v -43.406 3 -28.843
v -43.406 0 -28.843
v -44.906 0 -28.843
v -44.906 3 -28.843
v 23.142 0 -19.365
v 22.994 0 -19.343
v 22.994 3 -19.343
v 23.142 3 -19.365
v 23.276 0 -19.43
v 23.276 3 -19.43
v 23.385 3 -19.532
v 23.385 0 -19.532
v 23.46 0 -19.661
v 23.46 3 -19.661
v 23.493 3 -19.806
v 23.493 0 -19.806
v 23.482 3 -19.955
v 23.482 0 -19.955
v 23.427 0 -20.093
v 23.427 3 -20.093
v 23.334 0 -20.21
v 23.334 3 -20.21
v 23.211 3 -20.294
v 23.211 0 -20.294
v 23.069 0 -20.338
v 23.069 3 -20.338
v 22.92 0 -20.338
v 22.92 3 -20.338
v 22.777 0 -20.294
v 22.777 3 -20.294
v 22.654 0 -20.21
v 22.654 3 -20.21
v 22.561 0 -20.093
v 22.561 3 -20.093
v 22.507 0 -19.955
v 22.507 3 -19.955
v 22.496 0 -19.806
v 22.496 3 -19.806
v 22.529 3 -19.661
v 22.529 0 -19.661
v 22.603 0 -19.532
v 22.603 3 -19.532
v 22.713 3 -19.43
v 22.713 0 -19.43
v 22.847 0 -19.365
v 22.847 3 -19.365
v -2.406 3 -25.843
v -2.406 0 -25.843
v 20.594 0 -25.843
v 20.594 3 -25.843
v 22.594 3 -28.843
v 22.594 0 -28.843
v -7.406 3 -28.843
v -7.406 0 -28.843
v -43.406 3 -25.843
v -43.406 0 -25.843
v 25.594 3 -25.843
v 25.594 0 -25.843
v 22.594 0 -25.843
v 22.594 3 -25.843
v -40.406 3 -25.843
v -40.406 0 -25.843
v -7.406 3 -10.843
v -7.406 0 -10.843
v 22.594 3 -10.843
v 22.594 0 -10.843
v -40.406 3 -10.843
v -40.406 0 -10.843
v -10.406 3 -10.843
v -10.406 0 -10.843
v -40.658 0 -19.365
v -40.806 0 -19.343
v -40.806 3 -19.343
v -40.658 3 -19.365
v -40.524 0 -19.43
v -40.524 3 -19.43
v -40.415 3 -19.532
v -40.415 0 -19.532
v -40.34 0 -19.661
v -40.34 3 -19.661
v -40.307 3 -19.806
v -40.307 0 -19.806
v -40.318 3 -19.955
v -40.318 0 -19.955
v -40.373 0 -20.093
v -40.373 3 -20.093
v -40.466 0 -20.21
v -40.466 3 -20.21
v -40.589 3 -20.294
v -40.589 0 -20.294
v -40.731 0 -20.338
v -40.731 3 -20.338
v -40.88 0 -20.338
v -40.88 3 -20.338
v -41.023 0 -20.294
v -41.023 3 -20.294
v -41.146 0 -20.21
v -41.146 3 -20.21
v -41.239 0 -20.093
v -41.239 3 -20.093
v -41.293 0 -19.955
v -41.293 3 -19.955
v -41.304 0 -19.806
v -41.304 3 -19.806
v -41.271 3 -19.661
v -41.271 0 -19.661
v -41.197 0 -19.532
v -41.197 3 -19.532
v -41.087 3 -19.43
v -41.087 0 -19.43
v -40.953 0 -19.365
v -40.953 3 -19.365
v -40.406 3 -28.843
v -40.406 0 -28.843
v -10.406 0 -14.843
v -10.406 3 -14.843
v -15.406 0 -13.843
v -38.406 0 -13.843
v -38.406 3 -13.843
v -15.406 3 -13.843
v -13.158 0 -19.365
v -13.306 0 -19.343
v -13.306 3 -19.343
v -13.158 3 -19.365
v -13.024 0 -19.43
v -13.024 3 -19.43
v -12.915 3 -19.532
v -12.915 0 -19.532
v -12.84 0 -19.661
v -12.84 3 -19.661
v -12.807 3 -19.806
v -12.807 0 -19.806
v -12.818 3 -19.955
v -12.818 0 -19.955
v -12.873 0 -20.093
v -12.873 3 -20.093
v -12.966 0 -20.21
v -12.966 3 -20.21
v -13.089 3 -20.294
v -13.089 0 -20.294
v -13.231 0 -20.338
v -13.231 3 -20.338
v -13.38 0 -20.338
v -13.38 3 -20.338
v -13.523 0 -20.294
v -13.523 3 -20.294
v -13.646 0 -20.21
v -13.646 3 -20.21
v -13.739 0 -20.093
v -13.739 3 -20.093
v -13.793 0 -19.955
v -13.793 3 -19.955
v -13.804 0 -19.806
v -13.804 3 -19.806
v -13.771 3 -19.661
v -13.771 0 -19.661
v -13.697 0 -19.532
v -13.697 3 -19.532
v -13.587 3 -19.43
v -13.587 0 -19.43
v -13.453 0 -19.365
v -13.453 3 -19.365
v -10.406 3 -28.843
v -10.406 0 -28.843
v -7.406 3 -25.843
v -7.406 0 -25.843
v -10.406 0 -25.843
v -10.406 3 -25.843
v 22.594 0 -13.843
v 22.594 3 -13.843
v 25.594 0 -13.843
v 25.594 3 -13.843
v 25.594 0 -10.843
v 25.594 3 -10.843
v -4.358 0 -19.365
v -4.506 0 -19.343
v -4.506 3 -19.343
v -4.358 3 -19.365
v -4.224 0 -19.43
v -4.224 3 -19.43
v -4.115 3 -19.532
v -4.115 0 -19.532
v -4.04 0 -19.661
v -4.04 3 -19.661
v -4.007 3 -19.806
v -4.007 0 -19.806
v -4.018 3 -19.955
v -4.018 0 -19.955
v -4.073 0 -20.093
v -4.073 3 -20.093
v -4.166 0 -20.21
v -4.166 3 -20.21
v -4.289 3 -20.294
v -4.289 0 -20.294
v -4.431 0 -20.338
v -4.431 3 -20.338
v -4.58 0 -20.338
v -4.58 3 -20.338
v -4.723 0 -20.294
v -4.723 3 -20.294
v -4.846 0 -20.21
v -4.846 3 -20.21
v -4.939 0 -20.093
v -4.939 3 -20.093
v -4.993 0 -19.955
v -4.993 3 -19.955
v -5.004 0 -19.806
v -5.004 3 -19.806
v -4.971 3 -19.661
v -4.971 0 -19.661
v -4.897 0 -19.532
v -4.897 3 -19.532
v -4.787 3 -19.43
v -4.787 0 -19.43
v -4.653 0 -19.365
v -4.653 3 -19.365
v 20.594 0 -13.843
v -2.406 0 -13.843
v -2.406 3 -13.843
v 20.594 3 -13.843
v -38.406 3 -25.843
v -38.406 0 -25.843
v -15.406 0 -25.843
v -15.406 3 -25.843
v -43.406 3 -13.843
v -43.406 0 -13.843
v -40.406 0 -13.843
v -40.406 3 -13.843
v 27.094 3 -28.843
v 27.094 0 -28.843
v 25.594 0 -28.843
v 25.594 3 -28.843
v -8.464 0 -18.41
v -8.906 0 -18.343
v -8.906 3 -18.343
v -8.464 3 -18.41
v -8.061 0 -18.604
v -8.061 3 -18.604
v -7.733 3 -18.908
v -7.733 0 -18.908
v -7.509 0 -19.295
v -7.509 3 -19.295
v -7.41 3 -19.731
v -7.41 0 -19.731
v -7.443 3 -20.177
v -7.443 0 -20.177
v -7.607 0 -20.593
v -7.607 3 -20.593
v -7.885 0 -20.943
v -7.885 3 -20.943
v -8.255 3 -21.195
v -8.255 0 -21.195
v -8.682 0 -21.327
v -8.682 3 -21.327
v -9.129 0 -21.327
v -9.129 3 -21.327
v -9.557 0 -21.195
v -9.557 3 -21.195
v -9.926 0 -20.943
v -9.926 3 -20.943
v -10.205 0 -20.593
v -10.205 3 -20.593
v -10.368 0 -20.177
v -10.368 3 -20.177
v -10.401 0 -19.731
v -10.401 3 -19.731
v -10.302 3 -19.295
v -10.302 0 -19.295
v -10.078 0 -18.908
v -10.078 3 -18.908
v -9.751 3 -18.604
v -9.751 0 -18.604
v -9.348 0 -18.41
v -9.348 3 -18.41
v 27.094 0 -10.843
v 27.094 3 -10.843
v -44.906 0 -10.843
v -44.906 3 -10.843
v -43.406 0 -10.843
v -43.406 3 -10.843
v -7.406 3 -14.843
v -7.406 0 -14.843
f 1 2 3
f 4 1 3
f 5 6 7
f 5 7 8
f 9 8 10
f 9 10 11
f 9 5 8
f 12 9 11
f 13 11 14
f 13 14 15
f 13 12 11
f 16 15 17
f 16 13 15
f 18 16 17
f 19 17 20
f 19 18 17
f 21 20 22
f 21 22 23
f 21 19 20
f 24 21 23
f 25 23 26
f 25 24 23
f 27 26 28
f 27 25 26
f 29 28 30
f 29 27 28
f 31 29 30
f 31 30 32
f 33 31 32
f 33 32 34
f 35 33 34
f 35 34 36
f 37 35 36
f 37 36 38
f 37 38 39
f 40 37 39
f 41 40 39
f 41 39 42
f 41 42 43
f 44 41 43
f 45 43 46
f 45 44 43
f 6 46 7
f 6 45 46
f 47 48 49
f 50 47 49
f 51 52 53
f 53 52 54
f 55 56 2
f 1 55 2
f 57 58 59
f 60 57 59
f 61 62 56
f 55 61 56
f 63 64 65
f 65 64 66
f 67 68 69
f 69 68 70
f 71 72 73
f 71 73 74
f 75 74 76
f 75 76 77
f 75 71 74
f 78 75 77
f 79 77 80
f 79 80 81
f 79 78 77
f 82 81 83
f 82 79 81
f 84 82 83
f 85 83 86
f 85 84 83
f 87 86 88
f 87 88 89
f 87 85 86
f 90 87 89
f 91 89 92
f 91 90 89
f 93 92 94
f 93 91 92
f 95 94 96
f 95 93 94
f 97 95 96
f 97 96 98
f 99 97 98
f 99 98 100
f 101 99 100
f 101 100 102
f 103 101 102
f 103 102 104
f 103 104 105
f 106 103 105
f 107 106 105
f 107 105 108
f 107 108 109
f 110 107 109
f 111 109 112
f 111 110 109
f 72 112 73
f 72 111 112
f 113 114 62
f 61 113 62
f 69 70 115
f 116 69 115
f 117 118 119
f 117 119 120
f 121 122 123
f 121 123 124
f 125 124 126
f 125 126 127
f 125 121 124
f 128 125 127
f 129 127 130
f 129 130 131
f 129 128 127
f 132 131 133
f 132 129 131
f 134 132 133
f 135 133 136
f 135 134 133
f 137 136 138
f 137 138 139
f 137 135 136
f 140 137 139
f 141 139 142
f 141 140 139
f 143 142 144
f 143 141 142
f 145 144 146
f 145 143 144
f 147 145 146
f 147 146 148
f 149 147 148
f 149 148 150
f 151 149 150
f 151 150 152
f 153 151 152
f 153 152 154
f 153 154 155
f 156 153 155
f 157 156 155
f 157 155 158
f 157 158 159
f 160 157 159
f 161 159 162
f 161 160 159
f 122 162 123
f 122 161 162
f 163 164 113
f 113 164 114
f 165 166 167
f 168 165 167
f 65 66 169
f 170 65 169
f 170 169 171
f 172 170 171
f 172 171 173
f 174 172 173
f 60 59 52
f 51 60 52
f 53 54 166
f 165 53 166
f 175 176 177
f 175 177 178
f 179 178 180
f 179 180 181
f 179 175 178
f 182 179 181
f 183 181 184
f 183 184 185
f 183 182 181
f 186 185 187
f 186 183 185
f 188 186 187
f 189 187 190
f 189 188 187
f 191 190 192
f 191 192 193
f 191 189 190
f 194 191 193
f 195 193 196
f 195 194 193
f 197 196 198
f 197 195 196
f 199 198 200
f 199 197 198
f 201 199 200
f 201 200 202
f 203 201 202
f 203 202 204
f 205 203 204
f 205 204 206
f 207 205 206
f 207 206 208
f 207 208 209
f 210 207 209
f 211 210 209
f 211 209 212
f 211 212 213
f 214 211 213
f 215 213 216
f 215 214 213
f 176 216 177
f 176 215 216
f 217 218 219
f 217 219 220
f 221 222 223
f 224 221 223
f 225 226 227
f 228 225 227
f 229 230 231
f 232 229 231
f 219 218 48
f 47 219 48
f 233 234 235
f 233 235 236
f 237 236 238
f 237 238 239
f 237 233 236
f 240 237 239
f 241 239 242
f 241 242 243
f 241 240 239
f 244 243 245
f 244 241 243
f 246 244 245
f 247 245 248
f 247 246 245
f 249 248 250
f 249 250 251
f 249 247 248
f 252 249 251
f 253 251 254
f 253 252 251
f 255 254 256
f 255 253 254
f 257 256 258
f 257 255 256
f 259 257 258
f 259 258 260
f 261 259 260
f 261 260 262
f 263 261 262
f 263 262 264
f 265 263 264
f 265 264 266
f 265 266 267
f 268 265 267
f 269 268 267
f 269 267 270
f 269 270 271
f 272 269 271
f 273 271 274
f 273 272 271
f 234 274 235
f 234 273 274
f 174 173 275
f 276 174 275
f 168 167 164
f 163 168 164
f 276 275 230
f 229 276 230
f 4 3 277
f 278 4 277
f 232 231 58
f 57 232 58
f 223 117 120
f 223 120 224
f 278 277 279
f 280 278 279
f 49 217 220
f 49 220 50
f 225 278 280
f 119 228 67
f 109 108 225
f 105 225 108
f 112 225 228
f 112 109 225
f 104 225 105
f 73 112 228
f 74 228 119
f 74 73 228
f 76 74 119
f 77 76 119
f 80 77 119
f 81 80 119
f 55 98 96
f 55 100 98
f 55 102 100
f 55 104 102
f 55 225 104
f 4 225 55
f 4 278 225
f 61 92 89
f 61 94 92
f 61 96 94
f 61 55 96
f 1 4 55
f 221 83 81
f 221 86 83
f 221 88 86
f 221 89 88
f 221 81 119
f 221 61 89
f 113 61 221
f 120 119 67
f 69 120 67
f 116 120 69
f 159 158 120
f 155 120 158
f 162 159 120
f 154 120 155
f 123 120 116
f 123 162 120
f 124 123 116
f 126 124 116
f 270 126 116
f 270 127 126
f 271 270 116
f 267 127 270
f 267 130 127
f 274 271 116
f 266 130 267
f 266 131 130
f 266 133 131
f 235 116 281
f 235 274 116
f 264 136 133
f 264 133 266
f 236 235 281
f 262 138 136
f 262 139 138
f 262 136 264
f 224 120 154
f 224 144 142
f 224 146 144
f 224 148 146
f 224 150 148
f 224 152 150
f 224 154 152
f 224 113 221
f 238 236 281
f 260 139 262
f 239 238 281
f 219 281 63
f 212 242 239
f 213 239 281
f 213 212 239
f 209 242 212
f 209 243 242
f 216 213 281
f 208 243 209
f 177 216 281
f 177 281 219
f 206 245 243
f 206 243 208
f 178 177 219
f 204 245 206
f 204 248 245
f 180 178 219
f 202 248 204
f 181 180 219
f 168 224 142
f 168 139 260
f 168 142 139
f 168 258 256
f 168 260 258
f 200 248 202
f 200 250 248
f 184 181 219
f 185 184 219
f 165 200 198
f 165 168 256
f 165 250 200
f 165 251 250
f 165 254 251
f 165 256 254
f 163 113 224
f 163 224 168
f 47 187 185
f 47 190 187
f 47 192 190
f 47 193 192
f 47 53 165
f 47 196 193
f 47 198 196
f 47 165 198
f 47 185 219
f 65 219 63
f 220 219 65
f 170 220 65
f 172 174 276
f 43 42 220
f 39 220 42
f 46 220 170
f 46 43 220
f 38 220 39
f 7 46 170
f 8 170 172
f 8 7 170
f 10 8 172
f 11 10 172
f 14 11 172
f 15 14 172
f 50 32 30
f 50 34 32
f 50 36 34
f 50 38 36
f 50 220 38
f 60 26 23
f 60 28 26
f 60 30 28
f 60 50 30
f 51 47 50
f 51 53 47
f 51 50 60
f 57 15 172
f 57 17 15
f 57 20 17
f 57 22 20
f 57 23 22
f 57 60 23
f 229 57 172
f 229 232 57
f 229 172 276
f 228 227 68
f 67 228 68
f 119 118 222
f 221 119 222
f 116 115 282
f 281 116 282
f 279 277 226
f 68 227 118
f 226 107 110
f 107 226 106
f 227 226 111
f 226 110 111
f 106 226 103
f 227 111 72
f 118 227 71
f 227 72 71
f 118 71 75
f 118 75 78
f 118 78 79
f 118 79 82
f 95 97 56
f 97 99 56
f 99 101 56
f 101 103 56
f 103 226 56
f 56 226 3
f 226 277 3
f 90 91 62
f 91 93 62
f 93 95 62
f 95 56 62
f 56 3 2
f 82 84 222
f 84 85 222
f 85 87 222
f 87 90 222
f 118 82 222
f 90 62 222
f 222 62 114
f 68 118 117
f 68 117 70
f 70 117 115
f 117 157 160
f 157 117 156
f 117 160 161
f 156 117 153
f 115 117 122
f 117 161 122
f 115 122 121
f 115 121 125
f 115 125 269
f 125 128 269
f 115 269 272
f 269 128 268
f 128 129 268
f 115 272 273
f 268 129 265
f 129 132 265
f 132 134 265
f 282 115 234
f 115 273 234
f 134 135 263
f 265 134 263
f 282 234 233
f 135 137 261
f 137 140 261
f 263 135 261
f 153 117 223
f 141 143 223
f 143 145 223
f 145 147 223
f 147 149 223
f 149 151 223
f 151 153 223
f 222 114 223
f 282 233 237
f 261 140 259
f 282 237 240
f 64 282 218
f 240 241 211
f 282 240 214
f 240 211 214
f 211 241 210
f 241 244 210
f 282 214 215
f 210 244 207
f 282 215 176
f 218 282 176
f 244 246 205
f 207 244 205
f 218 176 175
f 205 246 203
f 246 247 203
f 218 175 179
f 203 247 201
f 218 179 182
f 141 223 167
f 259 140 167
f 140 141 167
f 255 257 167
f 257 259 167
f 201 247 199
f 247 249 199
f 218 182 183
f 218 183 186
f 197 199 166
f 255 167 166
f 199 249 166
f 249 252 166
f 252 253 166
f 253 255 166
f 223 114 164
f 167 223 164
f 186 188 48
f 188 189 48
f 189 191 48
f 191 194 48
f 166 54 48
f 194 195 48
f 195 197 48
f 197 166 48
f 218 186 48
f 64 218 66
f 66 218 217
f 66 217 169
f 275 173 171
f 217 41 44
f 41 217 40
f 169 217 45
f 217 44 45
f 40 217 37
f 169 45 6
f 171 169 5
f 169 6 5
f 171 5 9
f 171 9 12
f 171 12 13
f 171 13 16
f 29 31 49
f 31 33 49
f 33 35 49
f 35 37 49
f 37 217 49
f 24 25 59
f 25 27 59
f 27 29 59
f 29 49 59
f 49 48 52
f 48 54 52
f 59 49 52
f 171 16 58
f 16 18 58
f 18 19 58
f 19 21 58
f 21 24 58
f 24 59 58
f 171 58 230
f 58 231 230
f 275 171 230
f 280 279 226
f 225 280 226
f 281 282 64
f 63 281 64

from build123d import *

# Parameters (mm, degrees)
SKETCH_1_R      = 1.5
SKETCH_1_R_2    = 0.5
SKETCH_1_W      = 23
SKETCH_1_H      = 12
EXTRUDE_1_DEPTH = 3


with BuildPart() as part:
    # 草图1 → 凸台-拉伸1 (new body)
    with BuildSketch(Plane(origin=(0, 0, 0), x_dir=(1, 0, 0), z_dir=(0, 1, 0))):
        Polygon((22.594315567, 25.84326654), (22.594315567, 28.84326654), (-7.405684433, 28.84326654), (-7.405684433, 25.84326654), (-10.405684433, 25.84326654), (-10.405684433, 28.84326654), (-40.405684433, 28.84326654), (-40.405684433, 25.84326654), (-43.405684433, 25.84326654), (-43.405684433, 28.84326654), (-44.905684433, 28.84326654), (-44.905684433, 10.84326654), (-43.405684433, 10.84326654), (-43.405684433, 13.84326654), (-40.405684433, 13.84326654), (-40.405684433, 10.84326654), (-10.405684433, 10.84326654), (-10.405684433, 14.84326654), (-7.405684433, 14.84326654), (-7.405684433, 10.84326654), (22.594315567, 10.84326654), (22.594315567, 13.84326654), (25.594315567, 13.84326654), (25.594315567, 10.84326654), (27.094315567, 10.84326654), (27.094315567, 28.84326654), (25.594315567, 28.84326654), (25.594315567, 25.84326654), align=None)
        with Locations(Location((-8.905684433, 19.84326654, 0), (0, 0, 270))):
            Circle(SKETCH_1_R, mode=Mode.SUBTRACT)
        with Locations(Location((-4.505684433, 19.84326654, 0), (0, 0, 270))):
            Circle(SKETCH_1_R_2, mode=Mode.SUBTRACT)
        with Locations(Location((-40.805684433, 19.84326654, 0), (0, 0, 270))):
            Circle(SKETCH_1_R_2, mode=Mode.SUBTRACT)
        with Locations(Location((-13.305684433, 19.84326654, 0), (0, 0, 270))):
            Circle(SKETCH_1_R_2, mode=Mode.SUBTRACT)
        with Locations(Location((22.994315567, 19.84326654, 0), (0, 0, 270))):
            Circle(SKETCH_1_R_2, mode=Mode.SUBTRACT)
        with Locations((9.094315567, 19.84326654)):
            Rectangle(SKETCH_1_W, SKETCH_1_H, mode=Mode.SUBTRACT)
        with Locations((-26.905684433, 19.84326654)):
            Rectangle(SKETCH_1_W, SKETCH_1_H, mode=Mode.SUBTRACT)
    extrude(amount=EXTRUDE_1_DEPTH)


solid = part.part
